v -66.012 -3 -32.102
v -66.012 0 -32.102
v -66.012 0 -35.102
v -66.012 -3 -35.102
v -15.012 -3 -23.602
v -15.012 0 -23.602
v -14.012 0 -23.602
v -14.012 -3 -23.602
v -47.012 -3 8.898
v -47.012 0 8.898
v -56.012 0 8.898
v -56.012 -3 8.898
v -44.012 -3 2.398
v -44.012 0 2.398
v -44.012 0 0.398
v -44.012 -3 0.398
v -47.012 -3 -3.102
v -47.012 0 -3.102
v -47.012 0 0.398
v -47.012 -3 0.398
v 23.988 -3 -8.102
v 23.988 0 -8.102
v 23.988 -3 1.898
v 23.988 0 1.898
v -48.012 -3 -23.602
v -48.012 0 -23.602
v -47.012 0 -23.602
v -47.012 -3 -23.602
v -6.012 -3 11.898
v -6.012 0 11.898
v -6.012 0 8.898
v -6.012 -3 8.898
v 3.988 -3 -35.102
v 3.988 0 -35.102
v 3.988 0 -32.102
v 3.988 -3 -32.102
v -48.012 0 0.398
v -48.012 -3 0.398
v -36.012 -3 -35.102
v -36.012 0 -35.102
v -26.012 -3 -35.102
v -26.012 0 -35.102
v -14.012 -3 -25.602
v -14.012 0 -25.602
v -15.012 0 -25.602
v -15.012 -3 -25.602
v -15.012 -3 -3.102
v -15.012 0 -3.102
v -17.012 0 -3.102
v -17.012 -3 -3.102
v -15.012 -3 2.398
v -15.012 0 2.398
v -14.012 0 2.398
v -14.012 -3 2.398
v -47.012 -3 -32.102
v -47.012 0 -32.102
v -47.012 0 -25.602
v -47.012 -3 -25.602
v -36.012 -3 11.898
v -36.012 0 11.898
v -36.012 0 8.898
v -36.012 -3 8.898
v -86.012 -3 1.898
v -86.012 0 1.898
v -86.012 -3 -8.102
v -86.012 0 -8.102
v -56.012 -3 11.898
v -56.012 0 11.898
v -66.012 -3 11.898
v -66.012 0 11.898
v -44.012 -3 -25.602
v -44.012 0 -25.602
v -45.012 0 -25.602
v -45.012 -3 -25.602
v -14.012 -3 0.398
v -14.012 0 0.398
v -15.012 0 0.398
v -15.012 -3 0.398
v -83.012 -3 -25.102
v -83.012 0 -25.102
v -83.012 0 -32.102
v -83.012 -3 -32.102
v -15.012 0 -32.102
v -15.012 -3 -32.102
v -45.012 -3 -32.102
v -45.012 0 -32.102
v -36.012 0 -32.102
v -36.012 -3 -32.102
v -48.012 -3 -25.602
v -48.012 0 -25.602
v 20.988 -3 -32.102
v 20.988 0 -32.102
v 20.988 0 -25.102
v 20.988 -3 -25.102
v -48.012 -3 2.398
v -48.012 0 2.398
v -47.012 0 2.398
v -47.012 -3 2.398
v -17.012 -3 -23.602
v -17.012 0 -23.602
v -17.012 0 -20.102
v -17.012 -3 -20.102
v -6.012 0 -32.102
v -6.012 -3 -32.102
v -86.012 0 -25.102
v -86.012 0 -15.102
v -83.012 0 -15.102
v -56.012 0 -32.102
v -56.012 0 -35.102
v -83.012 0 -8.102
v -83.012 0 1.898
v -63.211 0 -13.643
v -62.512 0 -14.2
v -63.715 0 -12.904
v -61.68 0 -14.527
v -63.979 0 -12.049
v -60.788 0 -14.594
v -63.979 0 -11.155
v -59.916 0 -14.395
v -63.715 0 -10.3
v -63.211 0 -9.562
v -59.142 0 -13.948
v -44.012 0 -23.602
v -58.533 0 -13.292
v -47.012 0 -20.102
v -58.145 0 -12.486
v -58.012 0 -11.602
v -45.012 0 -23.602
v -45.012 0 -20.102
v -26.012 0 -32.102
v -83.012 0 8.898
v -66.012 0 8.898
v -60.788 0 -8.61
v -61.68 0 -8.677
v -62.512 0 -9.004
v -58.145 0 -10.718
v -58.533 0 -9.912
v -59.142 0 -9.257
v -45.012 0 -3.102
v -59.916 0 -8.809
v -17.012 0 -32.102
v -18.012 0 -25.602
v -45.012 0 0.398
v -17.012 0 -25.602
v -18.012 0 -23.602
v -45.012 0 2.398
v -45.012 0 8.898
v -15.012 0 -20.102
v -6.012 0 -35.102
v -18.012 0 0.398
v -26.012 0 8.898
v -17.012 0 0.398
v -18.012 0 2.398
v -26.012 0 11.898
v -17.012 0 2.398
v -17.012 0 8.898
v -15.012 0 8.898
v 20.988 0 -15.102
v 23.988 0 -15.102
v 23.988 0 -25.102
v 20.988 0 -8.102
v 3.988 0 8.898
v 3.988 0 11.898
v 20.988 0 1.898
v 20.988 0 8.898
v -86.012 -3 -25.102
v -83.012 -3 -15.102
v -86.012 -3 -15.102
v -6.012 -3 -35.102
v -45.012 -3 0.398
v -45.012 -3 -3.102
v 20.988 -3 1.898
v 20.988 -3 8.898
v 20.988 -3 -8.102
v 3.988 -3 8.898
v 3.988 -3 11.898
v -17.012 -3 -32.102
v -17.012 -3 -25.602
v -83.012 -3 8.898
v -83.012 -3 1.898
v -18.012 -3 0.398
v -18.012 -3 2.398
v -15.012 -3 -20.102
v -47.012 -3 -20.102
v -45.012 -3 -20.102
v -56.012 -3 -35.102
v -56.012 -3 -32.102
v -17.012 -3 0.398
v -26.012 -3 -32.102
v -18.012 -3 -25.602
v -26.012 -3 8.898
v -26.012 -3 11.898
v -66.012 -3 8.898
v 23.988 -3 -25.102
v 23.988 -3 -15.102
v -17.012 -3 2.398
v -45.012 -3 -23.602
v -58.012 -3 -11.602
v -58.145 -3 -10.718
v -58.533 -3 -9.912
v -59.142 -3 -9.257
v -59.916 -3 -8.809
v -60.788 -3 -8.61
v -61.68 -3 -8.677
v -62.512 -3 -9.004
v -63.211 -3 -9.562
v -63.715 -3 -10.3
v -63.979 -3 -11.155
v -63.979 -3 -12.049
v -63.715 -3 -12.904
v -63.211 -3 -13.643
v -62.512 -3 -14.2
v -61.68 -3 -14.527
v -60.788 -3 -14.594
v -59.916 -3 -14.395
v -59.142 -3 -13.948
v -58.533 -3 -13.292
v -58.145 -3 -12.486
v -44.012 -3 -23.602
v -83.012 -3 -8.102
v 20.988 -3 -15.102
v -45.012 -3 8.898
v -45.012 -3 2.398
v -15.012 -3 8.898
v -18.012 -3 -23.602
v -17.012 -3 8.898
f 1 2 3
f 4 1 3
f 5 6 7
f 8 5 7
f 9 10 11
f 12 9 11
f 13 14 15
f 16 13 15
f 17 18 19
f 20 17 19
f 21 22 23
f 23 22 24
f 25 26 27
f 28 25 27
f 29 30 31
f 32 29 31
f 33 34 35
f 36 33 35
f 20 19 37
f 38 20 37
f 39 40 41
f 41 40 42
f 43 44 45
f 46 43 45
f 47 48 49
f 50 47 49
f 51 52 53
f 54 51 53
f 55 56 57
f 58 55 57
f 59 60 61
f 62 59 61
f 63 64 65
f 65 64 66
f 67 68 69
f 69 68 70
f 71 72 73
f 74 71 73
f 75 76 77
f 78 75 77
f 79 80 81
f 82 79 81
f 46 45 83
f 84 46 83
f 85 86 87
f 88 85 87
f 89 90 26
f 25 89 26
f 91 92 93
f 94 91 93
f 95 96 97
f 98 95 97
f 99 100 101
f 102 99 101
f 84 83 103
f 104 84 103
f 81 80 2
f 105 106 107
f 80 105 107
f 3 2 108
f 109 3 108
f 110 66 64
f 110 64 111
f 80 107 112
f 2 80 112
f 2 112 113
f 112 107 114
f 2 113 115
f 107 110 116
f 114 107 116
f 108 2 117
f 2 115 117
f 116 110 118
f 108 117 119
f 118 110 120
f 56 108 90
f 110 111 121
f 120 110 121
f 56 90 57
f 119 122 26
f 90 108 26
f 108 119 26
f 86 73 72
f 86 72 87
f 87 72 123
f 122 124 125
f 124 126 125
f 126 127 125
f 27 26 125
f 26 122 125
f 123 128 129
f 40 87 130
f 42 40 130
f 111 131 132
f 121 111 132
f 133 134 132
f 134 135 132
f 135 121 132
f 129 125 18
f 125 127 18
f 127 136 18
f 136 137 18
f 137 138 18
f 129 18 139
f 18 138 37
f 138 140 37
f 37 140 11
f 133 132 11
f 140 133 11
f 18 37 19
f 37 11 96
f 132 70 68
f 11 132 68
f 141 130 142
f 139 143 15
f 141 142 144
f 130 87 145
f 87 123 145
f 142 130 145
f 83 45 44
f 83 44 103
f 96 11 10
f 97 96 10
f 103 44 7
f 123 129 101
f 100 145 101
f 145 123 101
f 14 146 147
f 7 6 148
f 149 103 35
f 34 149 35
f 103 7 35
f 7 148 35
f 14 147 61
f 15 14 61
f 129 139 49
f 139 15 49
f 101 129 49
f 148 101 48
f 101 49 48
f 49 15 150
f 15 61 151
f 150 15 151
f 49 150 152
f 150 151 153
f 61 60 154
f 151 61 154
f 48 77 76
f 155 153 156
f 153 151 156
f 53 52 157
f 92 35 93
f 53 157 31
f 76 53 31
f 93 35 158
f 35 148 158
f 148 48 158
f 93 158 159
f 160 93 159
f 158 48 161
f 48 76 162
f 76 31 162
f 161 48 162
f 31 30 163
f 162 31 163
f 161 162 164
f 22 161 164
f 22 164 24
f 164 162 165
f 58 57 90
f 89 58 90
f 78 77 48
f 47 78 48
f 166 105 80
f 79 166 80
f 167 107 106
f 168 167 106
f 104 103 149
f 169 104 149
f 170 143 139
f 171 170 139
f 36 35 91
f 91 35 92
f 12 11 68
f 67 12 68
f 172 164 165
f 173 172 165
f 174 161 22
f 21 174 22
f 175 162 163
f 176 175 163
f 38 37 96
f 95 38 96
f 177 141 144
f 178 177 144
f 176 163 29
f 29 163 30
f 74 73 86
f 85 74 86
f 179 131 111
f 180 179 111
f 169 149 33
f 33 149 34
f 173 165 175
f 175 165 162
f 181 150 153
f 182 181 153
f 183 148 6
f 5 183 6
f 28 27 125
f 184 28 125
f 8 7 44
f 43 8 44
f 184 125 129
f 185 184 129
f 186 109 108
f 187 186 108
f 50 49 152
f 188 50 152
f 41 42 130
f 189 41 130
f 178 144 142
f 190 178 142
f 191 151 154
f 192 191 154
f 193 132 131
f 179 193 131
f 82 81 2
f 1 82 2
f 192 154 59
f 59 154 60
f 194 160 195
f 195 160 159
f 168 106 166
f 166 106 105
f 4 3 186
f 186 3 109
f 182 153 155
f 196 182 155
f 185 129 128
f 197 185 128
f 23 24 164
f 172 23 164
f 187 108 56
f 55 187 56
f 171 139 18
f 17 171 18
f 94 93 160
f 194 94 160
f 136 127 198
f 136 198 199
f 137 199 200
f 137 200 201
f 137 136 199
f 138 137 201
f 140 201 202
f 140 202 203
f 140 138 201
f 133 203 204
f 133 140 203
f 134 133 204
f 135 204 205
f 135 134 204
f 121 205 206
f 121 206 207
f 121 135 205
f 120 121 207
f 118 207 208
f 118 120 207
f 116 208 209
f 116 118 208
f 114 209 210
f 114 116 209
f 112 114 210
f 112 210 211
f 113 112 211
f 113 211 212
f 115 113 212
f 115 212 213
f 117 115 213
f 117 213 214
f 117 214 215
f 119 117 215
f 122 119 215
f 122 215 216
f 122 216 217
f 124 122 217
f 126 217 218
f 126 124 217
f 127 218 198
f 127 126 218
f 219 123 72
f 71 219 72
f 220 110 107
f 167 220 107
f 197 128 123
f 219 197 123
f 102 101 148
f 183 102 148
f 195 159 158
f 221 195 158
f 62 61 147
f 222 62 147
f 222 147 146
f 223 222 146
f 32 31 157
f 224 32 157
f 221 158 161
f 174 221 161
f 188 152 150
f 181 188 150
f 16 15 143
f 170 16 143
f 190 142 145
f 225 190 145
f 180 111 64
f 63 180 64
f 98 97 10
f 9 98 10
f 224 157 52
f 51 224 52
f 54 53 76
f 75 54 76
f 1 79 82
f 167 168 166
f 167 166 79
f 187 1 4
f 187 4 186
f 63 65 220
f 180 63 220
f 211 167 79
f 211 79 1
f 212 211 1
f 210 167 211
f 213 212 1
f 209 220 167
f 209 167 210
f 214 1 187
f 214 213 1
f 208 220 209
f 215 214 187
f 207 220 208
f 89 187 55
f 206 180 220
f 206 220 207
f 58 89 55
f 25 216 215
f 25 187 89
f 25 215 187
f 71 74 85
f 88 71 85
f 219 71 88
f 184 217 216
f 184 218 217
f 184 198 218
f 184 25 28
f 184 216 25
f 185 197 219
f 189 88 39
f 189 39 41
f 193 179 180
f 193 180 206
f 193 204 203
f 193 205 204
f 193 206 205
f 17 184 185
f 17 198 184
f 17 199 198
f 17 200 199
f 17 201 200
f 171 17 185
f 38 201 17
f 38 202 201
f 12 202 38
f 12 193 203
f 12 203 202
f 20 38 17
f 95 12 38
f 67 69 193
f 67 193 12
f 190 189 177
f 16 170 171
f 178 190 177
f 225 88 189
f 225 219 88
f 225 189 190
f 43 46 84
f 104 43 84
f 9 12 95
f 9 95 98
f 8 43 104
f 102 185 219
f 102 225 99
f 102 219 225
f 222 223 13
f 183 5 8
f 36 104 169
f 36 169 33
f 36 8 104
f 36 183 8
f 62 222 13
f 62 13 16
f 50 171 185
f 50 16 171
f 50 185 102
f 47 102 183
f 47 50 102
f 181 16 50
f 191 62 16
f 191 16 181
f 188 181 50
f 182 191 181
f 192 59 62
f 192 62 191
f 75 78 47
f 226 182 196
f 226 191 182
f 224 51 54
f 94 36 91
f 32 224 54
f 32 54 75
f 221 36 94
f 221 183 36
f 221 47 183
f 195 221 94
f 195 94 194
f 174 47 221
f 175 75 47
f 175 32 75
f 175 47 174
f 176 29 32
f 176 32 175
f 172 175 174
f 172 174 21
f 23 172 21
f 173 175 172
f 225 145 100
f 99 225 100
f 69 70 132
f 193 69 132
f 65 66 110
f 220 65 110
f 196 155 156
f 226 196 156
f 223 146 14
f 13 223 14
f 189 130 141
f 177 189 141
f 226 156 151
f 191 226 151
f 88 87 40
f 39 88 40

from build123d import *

# Parameters (mm, degrees)
F0_R     = 3
F1_DEPTH = 3


with BuildPart() as f1:
    # F0 (on Front) → F1 (new body)
    with BuildSketch(Plane.XZ):
        Polygon((-47.012073, 8.897897), (-56.012073, 8.897897), (-56.012073, 11.897897), (-66.012073, 11.897897), (-66.012073, 8.897897), (-83.012073, 8.897897), (-83.012073, 1.897897), (-86.012073, 1.897897), (-86.012073, -8.102103), (-83.012073, -8.102103), (-83.012073, -11.602103), (-83.012073, -15.102103), (-86.012073, -15.102103), (-86.012073, -25.102103), (-83.012073, -25.102103), (-83.012073, -32.102103), (-66.012073, -32.102103), (-66.012073, -35.102103), (-56.012073, -35.102103), (-56.012073, -32.102103), (-47.012073, -32.102103), (-47.012073, -25.602103), (-48.012073, -25.602103), (-48.012073, -23.602103), (-47.012073, -23.602103), (-47.012073, -20.102103), (-45.012073, -20.102103), (-45.012073, -23.602103), (-44.012073, -23.602103), (-44.012073, -25.602103), (-45.012073, -25.602103), (-45.012073, -32.102103), (-36.012073, -32.102103), (-36.012073, -35.102103), (-31.012073, -35.102103), (-26.012073, -35.102103), (-26.012073, -32.102103), (-17.012073, -32.102103), (-17.012073, -25.602103), (-18.012073, -25.602103), (-18.012073, -23.602103), (-17.012073, -23.602103), (-17.012073, -20.102103), (-15.012073, -20.102103), (-15.012073, -23.602103), (-14.012073, -23.602103), (-14.012073, -25.602103), (-15.012073, -25.602103), (-15.012073, -32.102103), (-6.012073, -32.102103), (-6.012073, -35.102103), (3.987927, -35.102103), (3.987927, -32.102103), (20.987927, -32.102103), (20.987927, -25.102103), (23.987927, -25.102103), (23.987927, -15.102103), (20.987927, -15.102103), (20.987927, -11.602103), (20.987927, -8.102103), (23.987927, -8.102103), (23.987927, 1.897897), (20.987927, 1.897897), (20.987927, 8.897897), (3.987927, 8.897897), (3.987927, 11.897897), (-6.012073, 11.897897), (-6.012073, 8.897897), (-15.012073, 8.897897), (-15.012073, 2.397897), (-14.012073, 2.397897), (-14.012073, 0.397897), (-15.012073, 0.397897), (-15.012073, -3.102103), (-17.012073, -3.102103), (-17.012073, 0.397897), (-18.012073, 0.397897), (-18.012073, 2.397897), (-17.012073, 2.397897), (-17.012073, 8.897897), (-26.012073, 8.897897), (-26.012073, 11.897897), (-31.012073, 11.897897), (-36.012073, 11.897897), (-36.012073, 8.897897), (-45.012073, 8.897897), (-45.012073, 2.397897), (-44.012073, 2.397897), (-44.012073, 0.397897), (-45.012073, 0.397897), (-45.012073, -3.102103), (-47.012073, -3.102103), (-47.012073, 0.397897), (-48.012073, 0.397897), (-48.012073, 2.397897), (-47.012073, 2.397897), align=None)
        with Locations((-61.012073, -11.602103)):
            Circle(F0_R, mode=Mode.SUBTRACT)
    extrude(amount=F1_DEPTH)


solid = f1.part
